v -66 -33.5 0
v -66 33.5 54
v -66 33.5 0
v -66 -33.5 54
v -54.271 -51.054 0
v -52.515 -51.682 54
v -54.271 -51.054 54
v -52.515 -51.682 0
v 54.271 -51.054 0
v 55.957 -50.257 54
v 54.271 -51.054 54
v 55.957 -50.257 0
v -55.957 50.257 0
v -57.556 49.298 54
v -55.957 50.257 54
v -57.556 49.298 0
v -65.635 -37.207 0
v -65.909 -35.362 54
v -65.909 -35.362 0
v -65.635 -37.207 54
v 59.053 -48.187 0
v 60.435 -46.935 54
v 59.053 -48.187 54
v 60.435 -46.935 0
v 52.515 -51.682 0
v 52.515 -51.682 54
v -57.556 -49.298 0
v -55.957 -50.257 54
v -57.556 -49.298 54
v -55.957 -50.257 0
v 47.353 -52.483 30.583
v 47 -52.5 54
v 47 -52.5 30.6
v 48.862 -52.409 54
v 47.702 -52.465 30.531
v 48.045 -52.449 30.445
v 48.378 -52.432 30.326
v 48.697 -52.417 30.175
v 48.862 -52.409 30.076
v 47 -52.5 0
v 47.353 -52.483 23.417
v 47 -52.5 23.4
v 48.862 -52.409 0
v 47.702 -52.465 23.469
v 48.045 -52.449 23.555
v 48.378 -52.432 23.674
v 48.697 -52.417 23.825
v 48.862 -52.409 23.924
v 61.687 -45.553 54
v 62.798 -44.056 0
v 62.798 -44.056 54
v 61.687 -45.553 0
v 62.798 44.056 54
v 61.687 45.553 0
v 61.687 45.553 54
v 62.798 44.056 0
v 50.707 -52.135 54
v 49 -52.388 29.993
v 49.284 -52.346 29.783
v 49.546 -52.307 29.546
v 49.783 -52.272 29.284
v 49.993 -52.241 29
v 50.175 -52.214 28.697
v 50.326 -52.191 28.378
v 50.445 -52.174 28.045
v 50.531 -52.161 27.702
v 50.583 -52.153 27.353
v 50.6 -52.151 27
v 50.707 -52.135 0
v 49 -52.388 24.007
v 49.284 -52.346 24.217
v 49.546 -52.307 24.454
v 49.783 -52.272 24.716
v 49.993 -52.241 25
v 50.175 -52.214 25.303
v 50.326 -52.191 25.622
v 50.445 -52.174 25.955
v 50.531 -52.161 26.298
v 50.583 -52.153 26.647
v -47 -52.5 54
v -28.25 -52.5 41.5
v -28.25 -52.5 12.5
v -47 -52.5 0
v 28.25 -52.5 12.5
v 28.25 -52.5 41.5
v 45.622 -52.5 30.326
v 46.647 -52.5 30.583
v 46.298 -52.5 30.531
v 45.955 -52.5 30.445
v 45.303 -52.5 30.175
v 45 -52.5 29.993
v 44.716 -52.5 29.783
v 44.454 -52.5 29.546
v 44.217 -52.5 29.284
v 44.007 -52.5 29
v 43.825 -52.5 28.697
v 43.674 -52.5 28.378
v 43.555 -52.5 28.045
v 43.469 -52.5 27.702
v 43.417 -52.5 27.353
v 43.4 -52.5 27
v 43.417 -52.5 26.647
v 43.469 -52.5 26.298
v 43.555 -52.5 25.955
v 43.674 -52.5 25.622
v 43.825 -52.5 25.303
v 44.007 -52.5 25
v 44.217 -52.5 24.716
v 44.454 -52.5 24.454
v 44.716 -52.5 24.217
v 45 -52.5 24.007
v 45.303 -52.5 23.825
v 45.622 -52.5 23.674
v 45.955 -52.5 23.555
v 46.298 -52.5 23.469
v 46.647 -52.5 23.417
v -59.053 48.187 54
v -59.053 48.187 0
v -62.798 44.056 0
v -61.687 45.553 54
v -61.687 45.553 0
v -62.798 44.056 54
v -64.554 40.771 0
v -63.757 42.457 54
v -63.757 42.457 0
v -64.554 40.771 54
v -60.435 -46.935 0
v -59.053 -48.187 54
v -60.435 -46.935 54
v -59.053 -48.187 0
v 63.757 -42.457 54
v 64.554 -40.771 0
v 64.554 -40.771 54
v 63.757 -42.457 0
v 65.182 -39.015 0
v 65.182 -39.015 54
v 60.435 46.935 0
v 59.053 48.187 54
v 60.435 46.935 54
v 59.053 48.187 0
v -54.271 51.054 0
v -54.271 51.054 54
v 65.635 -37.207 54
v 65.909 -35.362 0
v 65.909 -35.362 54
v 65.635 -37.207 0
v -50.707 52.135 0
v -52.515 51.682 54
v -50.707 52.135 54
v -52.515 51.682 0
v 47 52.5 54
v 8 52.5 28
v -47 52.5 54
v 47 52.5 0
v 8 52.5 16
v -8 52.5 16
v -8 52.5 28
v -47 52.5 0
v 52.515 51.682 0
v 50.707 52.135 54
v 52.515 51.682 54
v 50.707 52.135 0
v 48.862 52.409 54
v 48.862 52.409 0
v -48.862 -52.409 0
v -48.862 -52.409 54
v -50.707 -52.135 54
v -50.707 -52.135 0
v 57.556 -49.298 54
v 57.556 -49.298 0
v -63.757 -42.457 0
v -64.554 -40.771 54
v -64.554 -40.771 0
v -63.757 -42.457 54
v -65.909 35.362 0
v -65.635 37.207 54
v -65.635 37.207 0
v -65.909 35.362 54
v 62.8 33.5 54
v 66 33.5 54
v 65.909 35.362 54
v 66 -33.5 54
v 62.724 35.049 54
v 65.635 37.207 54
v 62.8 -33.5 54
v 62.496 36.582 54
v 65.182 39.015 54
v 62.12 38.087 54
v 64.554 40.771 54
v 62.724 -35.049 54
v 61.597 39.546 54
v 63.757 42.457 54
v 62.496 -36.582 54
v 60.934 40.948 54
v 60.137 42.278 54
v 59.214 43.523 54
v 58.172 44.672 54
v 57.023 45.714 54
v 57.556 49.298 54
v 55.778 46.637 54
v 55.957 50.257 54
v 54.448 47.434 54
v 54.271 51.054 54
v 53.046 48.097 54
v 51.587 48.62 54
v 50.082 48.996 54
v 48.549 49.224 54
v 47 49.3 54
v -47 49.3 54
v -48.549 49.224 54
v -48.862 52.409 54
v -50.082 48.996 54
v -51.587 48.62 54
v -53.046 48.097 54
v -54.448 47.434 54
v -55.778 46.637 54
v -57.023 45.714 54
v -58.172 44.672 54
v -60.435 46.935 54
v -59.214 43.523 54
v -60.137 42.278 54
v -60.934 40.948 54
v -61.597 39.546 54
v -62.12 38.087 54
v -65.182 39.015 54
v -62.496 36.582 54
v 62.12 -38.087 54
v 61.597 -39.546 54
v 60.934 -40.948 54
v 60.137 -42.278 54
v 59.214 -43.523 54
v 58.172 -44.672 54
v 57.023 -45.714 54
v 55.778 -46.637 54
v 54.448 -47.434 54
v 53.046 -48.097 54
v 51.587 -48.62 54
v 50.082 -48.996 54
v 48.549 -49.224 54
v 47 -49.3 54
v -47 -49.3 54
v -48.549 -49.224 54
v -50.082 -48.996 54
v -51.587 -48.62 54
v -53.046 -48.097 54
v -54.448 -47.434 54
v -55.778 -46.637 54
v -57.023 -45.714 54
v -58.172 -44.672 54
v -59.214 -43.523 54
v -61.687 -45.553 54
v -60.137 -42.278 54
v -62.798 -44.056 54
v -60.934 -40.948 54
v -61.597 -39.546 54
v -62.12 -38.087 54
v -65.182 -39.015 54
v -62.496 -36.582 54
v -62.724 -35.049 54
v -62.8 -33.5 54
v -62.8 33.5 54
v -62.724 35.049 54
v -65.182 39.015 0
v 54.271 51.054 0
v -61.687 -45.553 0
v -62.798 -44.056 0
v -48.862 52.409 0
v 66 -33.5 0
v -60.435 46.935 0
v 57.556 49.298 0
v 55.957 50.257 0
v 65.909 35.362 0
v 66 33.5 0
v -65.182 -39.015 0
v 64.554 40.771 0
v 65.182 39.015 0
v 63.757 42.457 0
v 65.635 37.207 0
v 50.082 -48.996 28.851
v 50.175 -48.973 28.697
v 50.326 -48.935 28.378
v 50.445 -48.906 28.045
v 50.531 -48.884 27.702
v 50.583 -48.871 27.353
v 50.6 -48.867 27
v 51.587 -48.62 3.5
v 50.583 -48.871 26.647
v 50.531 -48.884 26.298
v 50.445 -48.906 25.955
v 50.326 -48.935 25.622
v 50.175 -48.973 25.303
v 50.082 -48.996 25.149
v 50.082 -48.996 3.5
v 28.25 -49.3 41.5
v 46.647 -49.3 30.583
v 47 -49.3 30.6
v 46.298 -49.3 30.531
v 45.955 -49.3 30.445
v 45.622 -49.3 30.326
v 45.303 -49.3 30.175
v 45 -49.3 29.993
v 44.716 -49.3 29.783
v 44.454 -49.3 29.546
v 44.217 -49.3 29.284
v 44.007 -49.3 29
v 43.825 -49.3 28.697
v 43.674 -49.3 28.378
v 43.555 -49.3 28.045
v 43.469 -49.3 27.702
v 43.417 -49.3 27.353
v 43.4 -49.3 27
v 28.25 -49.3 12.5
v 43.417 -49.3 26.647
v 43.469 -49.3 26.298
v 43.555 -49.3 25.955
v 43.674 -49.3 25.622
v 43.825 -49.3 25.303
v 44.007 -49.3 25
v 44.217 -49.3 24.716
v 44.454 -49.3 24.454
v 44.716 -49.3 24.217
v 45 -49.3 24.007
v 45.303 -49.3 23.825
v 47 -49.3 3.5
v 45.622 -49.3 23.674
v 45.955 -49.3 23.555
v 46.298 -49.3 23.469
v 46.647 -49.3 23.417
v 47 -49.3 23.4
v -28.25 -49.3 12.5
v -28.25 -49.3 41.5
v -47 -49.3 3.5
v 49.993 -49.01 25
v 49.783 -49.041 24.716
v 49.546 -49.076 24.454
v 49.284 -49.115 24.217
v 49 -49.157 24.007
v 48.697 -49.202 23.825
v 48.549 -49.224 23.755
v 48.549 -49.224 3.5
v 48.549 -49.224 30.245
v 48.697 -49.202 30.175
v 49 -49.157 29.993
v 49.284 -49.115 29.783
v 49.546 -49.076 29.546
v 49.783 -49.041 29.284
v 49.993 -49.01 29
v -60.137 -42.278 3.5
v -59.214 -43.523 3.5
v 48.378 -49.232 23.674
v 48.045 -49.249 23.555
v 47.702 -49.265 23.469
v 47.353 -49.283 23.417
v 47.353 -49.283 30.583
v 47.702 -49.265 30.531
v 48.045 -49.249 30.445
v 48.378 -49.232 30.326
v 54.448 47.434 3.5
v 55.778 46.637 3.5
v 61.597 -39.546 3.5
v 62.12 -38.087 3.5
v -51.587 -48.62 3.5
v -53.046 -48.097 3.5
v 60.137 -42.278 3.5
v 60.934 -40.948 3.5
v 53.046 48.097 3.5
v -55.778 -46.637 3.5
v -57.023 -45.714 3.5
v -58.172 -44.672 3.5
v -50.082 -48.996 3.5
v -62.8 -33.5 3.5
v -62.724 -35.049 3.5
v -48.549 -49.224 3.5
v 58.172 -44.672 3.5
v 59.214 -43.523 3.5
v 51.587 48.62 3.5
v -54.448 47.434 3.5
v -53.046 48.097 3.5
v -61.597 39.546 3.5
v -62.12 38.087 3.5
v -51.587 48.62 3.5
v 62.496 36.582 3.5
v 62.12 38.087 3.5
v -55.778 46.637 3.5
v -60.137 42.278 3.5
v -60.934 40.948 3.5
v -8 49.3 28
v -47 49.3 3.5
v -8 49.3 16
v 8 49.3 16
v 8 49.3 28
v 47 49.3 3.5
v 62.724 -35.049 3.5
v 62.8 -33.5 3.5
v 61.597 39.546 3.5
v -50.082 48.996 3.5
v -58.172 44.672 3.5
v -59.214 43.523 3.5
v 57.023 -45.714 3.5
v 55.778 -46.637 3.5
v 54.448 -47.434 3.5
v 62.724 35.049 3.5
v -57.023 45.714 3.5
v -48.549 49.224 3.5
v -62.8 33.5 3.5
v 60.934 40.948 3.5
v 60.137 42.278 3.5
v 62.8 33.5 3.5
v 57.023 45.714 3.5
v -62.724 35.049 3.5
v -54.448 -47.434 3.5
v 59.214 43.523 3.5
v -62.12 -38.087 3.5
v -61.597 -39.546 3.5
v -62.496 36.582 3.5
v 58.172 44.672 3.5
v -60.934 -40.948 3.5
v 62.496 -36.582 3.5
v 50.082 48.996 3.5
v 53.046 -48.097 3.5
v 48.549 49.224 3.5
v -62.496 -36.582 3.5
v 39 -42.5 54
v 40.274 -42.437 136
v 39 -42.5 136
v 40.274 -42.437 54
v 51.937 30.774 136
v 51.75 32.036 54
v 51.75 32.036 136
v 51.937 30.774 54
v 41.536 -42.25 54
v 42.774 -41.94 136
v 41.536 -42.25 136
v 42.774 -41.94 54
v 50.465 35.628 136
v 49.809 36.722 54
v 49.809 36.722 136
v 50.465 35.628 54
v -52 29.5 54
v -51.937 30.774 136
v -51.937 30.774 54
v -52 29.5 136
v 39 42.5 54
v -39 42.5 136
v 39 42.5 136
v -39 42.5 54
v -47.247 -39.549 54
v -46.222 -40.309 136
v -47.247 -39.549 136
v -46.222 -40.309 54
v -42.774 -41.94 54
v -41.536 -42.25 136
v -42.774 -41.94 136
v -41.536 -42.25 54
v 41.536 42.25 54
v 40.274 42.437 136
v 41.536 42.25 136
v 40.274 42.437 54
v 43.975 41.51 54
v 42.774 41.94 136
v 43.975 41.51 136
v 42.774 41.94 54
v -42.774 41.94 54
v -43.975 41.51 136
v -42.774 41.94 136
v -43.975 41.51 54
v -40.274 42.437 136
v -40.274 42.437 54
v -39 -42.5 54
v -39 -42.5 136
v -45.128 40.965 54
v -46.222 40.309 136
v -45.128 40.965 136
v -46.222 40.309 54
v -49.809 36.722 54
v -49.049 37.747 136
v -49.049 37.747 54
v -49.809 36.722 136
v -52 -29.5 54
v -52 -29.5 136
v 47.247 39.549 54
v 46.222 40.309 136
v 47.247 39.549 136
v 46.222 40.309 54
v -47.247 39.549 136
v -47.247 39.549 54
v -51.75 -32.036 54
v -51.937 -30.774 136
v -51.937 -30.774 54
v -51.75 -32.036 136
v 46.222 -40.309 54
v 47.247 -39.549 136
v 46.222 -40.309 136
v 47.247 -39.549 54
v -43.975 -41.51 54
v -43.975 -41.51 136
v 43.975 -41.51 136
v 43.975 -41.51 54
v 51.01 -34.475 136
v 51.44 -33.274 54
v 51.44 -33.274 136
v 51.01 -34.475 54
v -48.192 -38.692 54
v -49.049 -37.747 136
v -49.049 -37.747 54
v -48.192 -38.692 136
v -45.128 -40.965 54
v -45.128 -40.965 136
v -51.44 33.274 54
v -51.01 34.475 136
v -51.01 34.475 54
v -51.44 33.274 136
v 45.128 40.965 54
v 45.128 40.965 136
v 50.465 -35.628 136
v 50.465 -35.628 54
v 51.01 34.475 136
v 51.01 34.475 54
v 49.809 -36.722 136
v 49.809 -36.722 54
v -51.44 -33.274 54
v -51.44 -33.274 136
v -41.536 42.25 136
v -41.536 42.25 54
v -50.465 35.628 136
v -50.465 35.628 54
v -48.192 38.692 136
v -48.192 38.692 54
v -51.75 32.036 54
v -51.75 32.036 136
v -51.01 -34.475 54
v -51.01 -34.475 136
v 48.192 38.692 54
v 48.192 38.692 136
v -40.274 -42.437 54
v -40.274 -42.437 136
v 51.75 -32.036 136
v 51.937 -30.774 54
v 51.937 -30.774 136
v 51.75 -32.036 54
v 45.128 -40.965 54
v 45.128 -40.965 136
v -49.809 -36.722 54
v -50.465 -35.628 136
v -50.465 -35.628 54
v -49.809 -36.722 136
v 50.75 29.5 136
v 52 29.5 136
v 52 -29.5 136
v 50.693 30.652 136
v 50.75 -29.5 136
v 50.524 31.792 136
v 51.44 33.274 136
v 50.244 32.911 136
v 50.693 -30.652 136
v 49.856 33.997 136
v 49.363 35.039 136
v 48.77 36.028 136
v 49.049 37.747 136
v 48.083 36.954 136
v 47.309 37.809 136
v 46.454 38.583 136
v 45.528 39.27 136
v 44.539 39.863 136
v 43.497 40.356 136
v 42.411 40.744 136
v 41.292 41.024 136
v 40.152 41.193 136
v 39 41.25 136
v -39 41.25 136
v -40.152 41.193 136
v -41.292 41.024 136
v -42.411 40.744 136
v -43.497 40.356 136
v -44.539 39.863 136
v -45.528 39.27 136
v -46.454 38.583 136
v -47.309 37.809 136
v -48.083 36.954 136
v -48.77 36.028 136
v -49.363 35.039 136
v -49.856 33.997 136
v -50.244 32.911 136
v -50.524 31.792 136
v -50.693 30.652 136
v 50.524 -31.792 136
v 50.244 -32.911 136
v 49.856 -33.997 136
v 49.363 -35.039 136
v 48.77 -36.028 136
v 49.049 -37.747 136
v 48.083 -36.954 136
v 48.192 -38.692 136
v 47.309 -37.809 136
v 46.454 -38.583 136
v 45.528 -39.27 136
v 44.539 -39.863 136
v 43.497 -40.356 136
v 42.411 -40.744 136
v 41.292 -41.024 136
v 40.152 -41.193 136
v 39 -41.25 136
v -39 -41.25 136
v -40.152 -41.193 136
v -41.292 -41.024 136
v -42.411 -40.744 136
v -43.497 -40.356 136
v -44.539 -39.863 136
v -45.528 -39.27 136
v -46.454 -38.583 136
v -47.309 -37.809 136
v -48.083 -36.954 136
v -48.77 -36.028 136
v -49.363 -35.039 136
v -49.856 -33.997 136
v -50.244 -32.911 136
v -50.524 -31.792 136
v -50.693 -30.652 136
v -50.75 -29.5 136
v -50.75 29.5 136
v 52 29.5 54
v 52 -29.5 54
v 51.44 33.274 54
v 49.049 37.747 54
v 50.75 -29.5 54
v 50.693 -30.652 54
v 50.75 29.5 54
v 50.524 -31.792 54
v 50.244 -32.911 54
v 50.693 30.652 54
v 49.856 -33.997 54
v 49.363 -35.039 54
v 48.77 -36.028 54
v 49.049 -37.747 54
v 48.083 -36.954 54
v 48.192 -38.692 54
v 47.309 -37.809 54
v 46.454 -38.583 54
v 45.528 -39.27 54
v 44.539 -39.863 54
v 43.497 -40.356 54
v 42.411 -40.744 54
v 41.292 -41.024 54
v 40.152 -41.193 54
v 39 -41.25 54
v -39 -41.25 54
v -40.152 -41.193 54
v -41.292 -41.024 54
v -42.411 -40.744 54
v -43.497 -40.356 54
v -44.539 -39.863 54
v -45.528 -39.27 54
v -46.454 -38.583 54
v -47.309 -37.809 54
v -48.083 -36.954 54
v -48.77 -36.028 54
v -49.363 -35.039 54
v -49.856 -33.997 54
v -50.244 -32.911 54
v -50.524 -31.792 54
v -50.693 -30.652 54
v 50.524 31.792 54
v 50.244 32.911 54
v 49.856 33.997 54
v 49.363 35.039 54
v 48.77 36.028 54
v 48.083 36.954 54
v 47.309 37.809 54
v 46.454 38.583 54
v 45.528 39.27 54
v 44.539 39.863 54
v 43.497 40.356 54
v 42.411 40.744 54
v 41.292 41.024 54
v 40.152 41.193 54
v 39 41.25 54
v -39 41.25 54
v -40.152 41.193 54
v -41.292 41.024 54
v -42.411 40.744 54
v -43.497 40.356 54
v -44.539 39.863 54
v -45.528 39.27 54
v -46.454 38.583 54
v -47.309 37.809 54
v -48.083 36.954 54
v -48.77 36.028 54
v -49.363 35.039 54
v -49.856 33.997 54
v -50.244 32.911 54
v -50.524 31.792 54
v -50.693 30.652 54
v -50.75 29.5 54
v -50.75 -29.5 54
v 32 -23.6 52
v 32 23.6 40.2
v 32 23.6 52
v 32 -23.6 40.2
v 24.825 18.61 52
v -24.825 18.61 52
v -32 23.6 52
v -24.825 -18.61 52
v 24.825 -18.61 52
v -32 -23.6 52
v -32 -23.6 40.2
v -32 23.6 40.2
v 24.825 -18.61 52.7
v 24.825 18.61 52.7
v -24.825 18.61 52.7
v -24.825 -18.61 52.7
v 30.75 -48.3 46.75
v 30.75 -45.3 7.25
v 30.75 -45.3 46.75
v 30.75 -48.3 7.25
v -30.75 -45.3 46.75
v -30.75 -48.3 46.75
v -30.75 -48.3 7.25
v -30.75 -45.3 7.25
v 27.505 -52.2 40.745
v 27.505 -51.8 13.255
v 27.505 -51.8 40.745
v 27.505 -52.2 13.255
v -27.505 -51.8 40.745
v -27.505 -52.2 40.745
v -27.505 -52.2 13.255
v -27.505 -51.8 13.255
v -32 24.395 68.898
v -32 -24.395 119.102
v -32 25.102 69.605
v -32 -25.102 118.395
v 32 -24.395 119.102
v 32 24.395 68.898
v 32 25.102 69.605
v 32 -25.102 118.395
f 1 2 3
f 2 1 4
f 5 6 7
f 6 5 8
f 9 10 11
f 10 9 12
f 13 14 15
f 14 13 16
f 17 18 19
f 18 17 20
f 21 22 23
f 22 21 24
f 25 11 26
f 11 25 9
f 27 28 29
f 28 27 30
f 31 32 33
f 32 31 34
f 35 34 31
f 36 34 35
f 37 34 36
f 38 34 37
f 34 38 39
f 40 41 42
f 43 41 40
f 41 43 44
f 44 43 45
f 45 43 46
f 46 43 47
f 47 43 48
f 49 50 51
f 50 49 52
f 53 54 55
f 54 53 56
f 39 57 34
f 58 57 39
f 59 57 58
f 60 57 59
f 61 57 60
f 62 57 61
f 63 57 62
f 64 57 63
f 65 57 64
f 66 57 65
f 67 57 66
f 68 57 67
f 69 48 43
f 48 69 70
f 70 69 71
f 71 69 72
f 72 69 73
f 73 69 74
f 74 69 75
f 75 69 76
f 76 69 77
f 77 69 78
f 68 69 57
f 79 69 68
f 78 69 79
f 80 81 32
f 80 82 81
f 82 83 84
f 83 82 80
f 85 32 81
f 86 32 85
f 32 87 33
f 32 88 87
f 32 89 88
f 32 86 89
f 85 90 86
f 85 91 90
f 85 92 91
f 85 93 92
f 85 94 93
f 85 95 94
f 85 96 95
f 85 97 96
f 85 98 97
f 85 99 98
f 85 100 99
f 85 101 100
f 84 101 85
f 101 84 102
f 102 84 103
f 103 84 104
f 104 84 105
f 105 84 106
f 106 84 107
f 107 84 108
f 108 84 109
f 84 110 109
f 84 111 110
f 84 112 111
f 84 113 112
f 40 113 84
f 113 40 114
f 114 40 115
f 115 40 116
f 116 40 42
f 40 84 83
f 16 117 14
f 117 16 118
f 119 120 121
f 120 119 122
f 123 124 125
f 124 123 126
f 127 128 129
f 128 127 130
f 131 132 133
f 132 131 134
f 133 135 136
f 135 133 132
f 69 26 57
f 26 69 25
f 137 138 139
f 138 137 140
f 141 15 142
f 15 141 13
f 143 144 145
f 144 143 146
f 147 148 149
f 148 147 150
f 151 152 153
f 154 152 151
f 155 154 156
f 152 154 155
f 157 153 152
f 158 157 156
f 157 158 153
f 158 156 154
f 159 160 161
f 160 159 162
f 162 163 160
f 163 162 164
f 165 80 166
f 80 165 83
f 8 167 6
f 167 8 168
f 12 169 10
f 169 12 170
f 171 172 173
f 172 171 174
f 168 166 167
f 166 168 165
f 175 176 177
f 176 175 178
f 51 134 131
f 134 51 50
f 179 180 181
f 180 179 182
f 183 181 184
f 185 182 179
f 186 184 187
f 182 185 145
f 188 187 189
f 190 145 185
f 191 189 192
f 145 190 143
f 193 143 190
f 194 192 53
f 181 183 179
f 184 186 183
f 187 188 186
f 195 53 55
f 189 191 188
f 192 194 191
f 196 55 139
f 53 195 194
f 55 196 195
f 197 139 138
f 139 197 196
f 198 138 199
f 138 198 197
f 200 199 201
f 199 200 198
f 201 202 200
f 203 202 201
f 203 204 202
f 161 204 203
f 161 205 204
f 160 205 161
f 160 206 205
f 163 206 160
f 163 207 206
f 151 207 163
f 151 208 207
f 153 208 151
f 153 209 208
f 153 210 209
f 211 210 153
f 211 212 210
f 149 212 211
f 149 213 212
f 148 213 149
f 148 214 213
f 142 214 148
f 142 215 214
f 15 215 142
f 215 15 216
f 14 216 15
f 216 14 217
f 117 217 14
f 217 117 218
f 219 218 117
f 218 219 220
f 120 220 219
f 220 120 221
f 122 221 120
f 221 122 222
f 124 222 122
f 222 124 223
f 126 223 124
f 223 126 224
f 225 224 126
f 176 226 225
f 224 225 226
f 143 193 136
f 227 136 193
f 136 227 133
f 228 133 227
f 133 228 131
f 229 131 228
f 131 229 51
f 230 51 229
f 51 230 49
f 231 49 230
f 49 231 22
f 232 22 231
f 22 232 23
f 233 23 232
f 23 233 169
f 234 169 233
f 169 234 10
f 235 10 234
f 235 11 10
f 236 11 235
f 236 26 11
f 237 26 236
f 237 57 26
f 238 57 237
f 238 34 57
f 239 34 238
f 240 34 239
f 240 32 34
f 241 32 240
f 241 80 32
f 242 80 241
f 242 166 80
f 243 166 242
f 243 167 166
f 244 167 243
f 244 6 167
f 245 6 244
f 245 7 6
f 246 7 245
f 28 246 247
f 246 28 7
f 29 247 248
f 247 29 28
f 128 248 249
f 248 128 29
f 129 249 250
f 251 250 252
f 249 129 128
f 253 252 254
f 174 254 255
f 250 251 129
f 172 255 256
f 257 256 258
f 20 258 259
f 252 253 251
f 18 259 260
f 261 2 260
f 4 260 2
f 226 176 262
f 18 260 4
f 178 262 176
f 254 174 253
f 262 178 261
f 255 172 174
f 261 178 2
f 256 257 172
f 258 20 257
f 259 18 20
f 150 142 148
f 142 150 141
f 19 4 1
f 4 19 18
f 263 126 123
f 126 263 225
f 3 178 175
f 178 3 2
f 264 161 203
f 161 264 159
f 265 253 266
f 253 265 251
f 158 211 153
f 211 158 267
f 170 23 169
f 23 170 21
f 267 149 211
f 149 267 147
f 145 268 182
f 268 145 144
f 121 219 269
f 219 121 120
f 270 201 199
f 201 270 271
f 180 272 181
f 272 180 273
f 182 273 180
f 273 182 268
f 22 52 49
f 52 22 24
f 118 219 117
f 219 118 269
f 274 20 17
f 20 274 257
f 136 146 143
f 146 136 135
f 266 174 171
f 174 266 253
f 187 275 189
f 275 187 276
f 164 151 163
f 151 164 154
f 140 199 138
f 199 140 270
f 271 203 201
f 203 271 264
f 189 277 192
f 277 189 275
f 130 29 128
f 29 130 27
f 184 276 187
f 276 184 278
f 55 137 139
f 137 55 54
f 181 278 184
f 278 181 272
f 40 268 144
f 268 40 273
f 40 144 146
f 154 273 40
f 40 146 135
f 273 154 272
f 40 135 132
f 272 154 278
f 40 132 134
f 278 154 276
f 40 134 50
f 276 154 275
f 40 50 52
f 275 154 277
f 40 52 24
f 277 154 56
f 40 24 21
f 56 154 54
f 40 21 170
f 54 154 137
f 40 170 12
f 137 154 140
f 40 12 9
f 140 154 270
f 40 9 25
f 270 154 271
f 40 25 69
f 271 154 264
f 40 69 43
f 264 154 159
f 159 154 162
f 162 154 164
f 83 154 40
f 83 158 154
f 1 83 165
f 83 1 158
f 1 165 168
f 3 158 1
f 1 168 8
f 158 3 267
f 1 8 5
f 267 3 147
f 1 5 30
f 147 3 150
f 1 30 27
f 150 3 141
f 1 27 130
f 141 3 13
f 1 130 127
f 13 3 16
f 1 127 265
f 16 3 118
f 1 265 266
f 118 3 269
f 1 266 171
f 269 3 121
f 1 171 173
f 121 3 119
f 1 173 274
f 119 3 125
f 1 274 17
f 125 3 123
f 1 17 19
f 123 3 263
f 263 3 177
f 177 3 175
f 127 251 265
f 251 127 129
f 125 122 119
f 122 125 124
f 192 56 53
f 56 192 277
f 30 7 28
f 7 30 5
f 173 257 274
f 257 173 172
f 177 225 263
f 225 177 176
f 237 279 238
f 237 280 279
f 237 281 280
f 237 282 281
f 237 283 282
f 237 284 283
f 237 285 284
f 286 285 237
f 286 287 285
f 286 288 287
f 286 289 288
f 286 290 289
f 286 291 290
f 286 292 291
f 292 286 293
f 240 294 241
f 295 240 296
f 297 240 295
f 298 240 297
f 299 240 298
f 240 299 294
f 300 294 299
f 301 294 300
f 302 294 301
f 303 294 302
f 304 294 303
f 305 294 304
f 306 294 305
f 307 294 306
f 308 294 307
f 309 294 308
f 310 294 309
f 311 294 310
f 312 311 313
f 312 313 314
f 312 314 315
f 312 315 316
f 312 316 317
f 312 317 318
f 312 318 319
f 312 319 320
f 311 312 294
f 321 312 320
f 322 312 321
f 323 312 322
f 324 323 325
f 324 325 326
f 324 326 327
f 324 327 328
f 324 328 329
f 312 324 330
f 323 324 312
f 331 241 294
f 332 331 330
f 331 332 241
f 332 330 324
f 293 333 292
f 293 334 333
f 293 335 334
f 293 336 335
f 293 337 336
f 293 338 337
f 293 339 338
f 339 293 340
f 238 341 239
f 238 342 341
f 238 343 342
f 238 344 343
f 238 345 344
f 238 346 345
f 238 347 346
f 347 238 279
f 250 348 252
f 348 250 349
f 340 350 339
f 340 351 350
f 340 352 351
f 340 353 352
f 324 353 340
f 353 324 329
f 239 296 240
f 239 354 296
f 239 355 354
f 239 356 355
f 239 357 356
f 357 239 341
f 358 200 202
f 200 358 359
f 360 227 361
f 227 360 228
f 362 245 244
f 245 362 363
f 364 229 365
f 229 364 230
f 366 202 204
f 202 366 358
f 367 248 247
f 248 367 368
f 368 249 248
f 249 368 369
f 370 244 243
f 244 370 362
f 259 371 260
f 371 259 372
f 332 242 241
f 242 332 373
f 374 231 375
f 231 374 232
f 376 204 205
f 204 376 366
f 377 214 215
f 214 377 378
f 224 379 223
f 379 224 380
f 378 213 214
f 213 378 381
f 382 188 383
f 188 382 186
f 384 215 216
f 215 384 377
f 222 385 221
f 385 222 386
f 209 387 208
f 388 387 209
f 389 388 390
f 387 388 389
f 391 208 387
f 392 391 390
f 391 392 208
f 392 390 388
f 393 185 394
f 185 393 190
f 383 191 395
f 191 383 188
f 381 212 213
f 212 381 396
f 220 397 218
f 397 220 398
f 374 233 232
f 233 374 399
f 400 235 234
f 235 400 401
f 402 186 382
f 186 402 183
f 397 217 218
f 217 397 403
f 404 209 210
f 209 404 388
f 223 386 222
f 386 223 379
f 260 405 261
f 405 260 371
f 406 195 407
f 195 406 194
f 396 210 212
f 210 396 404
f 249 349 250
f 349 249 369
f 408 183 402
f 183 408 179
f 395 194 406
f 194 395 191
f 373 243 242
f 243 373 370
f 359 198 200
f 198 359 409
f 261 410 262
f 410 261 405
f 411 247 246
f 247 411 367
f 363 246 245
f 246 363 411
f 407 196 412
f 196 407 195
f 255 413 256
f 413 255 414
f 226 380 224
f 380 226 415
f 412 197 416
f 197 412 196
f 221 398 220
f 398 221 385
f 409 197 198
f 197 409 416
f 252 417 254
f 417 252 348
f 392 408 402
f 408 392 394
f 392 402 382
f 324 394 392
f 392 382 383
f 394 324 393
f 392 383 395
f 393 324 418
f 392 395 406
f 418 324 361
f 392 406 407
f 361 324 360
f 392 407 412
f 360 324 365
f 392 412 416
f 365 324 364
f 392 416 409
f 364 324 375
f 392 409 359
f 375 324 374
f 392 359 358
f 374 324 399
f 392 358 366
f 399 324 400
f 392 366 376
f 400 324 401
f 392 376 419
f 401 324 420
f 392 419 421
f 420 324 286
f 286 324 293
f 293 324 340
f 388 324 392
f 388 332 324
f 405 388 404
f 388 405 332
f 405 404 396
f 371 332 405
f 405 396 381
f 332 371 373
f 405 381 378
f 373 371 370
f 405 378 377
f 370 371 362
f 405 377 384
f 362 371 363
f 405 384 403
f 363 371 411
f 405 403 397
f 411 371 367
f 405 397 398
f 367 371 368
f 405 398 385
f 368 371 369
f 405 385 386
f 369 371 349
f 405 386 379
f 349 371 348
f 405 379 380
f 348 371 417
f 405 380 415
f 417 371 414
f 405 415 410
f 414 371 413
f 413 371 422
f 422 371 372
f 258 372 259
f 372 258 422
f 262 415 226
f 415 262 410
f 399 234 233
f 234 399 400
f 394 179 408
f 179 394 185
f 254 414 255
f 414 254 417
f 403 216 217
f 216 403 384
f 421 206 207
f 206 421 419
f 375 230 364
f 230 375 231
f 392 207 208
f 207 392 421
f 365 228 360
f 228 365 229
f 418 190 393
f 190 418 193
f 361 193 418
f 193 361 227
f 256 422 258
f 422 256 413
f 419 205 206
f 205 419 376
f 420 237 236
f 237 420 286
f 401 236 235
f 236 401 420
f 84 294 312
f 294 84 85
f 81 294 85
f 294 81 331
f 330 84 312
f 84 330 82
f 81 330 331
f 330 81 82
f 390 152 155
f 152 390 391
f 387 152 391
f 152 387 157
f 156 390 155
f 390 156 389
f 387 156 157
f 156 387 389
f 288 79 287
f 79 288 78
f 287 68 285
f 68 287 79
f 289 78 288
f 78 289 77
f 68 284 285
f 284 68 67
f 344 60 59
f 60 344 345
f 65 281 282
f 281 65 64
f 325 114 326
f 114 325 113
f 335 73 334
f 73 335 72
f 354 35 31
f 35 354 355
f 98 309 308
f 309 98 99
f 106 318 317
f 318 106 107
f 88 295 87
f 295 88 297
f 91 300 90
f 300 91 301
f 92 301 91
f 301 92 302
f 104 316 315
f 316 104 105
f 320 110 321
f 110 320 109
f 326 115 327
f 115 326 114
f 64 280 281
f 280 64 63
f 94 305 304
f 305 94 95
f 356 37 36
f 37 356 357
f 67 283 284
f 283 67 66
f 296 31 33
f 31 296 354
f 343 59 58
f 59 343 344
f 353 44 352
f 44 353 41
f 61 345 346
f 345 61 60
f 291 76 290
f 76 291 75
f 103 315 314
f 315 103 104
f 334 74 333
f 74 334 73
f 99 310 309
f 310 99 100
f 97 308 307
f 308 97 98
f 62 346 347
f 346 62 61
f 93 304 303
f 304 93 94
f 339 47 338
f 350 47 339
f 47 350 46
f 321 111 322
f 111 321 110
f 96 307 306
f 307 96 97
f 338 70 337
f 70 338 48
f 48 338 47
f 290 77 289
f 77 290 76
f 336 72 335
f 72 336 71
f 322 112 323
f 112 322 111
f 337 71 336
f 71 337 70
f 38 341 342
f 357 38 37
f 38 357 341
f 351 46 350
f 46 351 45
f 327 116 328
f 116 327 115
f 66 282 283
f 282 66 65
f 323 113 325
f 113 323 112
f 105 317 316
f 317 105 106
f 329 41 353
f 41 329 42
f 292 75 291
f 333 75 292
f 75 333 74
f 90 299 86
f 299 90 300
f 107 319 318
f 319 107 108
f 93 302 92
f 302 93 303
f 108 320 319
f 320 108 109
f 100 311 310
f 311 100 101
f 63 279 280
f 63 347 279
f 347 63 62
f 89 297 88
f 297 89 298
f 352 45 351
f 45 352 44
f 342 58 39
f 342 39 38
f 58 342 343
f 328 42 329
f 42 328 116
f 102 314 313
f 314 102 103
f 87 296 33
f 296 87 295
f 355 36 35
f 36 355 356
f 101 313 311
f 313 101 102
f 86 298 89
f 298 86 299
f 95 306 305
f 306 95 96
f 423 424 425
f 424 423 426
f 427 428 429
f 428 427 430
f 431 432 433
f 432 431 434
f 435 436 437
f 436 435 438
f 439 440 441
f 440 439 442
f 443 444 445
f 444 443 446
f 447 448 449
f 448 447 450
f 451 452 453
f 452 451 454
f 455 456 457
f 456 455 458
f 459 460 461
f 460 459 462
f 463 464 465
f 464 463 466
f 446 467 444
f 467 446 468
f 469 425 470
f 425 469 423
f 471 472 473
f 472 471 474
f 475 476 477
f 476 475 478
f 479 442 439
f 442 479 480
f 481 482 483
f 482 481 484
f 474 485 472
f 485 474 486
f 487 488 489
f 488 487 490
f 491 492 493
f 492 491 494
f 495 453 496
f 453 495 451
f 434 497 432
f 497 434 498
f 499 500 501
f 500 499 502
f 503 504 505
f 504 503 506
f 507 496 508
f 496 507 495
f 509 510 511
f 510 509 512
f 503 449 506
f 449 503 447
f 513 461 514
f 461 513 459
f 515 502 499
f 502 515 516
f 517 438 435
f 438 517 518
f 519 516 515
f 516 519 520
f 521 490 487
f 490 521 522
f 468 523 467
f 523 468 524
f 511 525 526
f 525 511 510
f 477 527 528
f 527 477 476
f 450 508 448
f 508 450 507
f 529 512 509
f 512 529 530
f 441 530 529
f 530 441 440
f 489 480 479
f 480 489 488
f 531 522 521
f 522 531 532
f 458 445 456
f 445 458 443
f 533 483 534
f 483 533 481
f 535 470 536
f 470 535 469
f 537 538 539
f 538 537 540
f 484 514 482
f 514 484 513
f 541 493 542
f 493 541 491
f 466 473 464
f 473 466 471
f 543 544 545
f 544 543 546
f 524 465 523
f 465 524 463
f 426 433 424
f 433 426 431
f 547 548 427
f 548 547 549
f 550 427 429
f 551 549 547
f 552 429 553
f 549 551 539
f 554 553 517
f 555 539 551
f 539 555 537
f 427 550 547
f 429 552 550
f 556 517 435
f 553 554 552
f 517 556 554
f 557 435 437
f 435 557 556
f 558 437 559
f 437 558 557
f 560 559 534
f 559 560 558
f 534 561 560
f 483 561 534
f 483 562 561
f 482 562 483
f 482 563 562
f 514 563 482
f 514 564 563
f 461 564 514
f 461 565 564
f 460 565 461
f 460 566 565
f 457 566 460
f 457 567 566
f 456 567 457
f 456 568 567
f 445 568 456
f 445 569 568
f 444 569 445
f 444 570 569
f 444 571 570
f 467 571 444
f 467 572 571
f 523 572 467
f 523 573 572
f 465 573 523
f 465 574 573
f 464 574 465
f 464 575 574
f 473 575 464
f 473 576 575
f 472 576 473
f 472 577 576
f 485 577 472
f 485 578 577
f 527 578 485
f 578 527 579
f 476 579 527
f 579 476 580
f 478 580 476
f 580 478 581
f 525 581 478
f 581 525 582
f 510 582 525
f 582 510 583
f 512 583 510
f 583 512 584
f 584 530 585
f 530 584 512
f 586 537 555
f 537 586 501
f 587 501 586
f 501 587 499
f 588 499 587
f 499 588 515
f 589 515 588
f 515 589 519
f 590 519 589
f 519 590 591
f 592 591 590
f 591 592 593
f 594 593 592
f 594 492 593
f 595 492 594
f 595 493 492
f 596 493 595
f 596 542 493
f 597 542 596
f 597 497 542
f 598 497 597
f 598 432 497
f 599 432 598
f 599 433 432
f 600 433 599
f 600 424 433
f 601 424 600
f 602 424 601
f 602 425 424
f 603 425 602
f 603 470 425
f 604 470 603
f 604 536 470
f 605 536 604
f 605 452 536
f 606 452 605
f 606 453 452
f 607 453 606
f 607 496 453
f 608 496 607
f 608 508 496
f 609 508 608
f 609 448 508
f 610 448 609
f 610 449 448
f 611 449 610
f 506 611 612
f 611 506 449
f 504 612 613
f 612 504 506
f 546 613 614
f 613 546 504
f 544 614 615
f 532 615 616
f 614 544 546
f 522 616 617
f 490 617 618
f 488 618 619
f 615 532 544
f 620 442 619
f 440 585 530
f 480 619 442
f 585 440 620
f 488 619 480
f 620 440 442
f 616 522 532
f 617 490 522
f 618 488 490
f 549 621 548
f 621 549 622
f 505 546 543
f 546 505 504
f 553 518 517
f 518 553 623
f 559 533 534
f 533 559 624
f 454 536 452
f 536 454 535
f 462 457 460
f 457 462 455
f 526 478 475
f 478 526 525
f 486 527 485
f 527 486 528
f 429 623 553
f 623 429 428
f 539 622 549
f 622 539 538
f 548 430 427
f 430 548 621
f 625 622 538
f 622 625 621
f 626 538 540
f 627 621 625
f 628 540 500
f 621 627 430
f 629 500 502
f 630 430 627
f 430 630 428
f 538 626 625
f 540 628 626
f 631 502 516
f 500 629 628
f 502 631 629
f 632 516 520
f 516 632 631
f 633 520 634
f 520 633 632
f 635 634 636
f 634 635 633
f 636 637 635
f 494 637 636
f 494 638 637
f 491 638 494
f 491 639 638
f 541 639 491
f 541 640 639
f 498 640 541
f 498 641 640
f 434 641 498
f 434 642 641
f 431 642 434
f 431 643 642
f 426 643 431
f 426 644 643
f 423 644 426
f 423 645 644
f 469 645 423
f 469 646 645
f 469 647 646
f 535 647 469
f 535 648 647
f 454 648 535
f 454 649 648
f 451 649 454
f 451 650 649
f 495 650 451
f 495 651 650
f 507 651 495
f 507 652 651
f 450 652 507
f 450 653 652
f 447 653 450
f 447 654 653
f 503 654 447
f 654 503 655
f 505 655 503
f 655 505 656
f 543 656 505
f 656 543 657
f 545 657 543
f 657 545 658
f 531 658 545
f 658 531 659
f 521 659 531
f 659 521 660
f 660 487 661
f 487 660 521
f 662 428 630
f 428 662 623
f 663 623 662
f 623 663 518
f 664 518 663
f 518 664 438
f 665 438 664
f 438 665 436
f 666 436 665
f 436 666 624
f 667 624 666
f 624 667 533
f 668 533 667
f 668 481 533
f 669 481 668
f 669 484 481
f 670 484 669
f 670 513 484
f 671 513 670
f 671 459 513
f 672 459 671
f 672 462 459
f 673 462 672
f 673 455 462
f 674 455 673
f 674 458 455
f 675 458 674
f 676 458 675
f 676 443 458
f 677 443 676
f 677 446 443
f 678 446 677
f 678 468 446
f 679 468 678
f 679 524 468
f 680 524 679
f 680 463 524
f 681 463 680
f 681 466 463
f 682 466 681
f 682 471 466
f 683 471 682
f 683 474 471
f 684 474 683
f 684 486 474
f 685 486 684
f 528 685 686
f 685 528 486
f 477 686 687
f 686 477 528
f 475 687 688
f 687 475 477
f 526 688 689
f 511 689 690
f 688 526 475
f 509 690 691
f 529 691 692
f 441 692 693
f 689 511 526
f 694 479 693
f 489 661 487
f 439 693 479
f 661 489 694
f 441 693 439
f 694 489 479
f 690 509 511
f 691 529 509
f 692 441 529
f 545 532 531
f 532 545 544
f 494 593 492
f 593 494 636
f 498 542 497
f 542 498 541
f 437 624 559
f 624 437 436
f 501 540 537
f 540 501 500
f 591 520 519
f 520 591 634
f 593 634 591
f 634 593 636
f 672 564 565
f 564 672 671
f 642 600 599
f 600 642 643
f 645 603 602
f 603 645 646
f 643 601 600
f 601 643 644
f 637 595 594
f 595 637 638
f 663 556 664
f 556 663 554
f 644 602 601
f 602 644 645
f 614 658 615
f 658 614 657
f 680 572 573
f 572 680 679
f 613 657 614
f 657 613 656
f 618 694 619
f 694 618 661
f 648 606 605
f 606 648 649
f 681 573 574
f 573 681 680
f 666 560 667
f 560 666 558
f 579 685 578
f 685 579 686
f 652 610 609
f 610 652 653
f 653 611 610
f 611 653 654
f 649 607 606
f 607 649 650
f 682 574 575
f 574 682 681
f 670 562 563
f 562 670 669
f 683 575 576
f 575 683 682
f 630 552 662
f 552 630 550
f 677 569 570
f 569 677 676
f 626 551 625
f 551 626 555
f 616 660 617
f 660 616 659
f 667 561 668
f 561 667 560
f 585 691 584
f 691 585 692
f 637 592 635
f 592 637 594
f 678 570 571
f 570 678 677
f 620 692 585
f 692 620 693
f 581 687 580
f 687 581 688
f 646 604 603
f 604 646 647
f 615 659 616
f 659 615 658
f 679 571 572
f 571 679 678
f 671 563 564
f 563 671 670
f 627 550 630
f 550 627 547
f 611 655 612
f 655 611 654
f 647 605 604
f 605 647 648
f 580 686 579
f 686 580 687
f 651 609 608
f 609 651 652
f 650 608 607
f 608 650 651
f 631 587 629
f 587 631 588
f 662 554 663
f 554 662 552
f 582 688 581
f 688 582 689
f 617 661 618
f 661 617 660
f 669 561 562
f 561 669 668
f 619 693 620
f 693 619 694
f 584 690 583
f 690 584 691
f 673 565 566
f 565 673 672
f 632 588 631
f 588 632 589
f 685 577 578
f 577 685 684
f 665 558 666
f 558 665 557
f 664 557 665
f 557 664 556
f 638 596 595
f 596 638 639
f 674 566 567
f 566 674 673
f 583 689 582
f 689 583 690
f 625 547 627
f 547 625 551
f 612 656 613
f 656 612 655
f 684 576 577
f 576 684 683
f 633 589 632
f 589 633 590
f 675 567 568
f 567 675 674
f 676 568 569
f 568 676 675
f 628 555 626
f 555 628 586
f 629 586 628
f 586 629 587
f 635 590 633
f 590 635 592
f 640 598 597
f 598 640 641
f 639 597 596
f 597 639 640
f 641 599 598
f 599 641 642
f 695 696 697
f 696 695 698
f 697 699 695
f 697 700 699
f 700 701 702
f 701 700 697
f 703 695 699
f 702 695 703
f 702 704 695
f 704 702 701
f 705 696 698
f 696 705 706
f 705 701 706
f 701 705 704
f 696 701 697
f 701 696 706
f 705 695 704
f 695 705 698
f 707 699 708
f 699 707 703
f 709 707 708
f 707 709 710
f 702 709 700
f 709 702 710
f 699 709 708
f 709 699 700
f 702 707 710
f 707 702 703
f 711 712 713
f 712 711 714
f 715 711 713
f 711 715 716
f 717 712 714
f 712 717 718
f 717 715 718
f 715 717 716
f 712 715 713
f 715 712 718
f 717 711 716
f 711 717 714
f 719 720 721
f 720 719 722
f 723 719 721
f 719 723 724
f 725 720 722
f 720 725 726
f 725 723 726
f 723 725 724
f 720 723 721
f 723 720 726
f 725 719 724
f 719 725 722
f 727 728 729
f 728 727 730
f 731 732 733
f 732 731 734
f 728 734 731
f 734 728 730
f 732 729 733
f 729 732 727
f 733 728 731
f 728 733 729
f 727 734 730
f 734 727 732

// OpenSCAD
// V16 Rev C dimensioned optical/mechanical ENVELOPE ONLY.
// The main print can be checked for watertightness, but PCB mounts and actual
// manufacturing fit/USB bending/beam-splitter seating remain UNSIGNED.
$fn=64;MODE="assembly"; // "base", "assembly", "optics"
W=132;D=105;H=54;R=19;WALL=3.2;FLOOR=3.5;
CHW=104;CHD=85;CHH=82;CHR=13;
SOURCE_W=64;SOURCE_D=47.2;SOURCE_T=11.8;
PANEL_W=49.65;PANEL_D=37.22;
CLOCK_W=61.50;CLOCK_H=39.50;CLOCK_ACTIVE_W=55.01;CLOCK_ACTIVE_H=27.49;
WIN_W=56.5;WIN_H=29.0;REF_W=64;REF_H=70;REF_T=1;ANGLE=45;
module round2d(w,d,r){offset(r=r)square([w-2*r,d-2*r],center=true);}
module base(){
 difference(){
  linear_extrude(height=H)round2d(W,D,R);
  translate([0,0,FLOOR])linear_extrude(height=H+1)round2d(W-2*WALL,D-2*WALL,R-WALL);
  translate([-WIN_W/2,-D/2-1,H/2-WIN_H/2])cube([WIN_W,WALL+3,WIN_H]);
  translate([-8,D/2-WALL-2,16])cube([16,WALL+4,12]); // NOT measured USB
  translate([47,-D/2-1,H/2])rotate([-90,0,0])cylinder(d=7.2,h=WALL+4); // shaft placeholder
 }
}
module source(){
 color([.13,.13,.2])translate([-SOURCE_W/2,-SOURCE_D/2,H-SOURCE_T-2])cube([SOURCE_W,SOURCE_D,SOURCE_T]);
 color([.35,.12,.48])translate([-PANEL_W/2,-PANEL_D/2,H-2.1])cube([PANEL_W,PANEL_D,.8]);
}
module clock(){
 color([.14,.14,.2])translate([-CLOCK_W/2,-D/2+WALL+1,H/2-CLOCK_H/2])cube([CLOCK_W,3,CLOCK_H]);
 color([.42,.31,.56])translate([-CLOCK_ACTIVE_W/2,-D/2+.3,H/2-CLOCK_ACTIVE_H/2])cube([CLOCK_ACTIVE_W,.4,CLOCK_ACTIVE_H]);
}
module cover(){
 color([.77,.87,.97,.18])translate([0,0,H+CHH/2])
 difference(){
  linear_extrude(height=CHH,center=true)round2d(CHW,CHD,CHR);
  linear_extrude(height=CHH+.5,center=true)round2d(CHW-2.5,CHD-2.5,CHR-1.25);
 }
}
module reflector(){
 color([.56,.9,1,.36])translate([0,0,H+40])rotate([ANGLE,0,0])cube([REF_W,REF_T,REF_H],center=true);
}
if(MODE=="base")base();
else if(MODE=="optics"){cover();source();reflector();}
else if(MODE=="assembly"){color([.96,.91,.87])base();cover();reflector();source();clock();}
else assert(false,"unknown MODE");
